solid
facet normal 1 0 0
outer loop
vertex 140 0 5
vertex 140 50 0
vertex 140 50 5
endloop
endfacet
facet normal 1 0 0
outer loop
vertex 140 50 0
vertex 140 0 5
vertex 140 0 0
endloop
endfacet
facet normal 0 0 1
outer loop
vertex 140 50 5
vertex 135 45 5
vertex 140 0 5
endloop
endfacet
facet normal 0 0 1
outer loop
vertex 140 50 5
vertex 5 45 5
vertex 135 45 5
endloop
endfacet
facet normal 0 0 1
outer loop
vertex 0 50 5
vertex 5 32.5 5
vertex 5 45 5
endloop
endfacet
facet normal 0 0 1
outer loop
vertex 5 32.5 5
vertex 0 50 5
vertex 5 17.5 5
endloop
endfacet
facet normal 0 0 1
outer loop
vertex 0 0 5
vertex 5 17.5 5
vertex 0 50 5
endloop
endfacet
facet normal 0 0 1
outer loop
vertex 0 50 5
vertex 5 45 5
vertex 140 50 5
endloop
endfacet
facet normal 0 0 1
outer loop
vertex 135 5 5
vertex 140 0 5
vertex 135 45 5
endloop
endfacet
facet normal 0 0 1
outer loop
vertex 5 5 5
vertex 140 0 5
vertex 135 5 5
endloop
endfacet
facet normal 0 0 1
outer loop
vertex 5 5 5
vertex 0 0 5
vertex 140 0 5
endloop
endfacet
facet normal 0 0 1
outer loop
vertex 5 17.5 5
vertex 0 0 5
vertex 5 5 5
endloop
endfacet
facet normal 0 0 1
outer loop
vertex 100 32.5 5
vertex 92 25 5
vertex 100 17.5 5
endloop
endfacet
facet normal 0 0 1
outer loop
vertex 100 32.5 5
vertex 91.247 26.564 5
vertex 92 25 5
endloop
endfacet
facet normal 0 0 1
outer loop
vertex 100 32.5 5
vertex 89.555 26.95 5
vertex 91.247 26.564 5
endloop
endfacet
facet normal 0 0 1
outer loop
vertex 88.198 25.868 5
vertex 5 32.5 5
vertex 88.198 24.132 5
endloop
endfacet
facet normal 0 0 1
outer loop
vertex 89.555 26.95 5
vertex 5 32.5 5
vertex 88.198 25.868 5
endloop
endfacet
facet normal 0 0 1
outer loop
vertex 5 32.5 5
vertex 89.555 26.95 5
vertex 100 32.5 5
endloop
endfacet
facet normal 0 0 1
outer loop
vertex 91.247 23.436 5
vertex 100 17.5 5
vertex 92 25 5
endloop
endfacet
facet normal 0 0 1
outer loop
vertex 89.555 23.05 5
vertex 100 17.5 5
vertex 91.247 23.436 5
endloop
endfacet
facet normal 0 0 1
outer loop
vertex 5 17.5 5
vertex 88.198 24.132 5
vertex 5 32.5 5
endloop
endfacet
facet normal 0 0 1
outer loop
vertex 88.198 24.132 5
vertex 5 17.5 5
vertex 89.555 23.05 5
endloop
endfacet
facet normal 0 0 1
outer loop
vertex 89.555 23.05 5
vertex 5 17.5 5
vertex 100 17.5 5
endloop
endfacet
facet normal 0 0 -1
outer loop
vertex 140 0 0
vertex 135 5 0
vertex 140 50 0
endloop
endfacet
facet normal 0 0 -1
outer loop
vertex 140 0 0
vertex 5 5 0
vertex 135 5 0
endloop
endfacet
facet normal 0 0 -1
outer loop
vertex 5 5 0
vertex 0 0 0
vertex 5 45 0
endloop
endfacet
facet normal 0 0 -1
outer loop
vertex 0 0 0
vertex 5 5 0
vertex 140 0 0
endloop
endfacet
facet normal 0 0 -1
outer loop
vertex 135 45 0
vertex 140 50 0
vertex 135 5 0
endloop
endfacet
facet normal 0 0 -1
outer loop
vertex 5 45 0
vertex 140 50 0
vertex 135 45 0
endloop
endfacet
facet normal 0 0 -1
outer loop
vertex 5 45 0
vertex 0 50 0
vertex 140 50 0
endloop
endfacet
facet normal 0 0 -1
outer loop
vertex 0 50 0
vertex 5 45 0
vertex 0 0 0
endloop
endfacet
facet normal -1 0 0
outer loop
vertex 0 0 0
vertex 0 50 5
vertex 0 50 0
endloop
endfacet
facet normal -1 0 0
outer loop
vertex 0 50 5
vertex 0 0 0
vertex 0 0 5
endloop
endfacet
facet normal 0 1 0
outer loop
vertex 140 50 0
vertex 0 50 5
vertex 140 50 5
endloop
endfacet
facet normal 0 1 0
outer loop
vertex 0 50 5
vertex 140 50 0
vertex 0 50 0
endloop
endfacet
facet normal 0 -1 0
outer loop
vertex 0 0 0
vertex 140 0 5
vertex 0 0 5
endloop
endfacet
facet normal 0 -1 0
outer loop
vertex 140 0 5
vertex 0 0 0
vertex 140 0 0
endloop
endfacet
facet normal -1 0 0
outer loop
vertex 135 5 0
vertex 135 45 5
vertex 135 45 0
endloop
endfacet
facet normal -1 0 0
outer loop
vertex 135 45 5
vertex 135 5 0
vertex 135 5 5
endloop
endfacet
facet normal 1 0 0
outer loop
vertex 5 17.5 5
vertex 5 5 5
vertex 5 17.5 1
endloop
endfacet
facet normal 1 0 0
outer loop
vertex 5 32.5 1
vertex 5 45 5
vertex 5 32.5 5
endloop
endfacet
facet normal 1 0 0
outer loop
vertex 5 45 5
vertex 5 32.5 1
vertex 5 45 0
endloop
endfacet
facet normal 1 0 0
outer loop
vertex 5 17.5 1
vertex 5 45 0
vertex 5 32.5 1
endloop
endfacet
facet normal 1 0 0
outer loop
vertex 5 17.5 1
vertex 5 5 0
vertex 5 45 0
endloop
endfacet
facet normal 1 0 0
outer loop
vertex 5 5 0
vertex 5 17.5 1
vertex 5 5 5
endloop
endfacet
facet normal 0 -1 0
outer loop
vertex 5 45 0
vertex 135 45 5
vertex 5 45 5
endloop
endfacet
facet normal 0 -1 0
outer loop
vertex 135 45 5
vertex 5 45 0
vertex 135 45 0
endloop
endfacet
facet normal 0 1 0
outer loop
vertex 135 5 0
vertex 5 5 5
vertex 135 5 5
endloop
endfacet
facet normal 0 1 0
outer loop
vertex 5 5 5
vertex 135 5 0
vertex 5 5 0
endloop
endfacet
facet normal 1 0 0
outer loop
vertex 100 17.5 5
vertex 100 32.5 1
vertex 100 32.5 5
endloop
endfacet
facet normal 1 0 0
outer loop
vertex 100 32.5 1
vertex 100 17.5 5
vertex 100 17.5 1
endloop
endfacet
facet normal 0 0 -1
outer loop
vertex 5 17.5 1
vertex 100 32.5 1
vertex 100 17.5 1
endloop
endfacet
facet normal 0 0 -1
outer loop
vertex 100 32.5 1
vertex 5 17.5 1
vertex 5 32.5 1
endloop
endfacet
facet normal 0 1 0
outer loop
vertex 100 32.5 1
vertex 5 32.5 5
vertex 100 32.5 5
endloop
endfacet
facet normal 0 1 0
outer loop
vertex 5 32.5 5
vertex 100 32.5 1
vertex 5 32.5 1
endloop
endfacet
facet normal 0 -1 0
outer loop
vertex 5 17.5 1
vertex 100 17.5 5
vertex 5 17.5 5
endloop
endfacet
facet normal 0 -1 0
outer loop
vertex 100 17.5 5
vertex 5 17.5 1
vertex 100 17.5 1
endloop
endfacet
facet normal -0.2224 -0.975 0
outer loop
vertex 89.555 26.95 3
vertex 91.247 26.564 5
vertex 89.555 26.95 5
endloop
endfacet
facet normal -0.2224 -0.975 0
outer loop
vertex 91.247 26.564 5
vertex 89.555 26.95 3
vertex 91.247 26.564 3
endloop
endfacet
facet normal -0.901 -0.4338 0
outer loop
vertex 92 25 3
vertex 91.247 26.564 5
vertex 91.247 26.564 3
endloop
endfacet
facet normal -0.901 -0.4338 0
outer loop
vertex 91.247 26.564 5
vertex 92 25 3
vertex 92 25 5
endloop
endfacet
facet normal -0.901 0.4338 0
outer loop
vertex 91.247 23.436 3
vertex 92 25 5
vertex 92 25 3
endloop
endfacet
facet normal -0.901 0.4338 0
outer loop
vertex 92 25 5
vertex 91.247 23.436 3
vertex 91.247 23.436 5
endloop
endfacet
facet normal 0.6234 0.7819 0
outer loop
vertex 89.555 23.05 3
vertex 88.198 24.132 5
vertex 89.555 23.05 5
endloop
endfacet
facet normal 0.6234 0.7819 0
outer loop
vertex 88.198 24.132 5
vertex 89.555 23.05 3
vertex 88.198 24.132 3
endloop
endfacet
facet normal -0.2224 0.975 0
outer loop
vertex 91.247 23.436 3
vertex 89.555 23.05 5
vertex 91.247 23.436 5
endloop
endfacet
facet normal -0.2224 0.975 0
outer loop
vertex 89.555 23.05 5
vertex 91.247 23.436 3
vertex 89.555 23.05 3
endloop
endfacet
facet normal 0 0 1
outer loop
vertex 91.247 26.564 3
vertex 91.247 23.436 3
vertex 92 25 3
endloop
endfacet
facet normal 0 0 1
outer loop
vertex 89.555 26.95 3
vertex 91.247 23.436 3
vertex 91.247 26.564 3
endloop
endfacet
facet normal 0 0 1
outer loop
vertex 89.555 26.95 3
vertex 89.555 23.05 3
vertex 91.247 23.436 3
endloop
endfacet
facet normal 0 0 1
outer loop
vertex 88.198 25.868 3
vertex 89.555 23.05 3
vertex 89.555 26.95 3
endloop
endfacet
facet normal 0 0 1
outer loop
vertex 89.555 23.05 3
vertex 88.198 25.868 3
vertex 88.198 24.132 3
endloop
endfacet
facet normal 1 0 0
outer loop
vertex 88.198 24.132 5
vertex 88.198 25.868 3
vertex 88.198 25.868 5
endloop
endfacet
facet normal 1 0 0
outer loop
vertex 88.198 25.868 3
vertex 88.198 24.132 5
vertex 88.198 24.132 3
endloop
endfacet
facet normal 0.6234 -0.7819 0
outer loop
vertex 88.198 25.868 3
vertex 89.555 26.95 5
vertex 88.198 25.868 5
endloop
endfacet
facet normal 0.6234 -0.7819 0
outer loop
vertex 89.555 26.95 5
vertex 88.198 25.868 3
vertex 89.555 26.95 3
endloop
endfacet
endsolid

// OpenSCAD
// Generated by SolidPython 1.1.3 on 2023-10-12 19:07:09


union() {
	difference() {
		cube(size = [140, 50, 5]);
		translate(v = [5, 5, -0.5000000000]) {
			cube(size = [130, 40, 6]);
		}
		translate(v = [10, 25.0000000000, 2.5000000000]) {
			cylinder(h = 6, r = 2.0000000000);
		}
	}
	translate(v = [0, 17.5000000000, 1]) {
		difference() {
			cube(size = [100, 15, 4]);
			translate(v = [90, 7.5000000000, 2.0000000000]) {
				cylinder(h = 6, r = 2.0000000000);
			}
		}
	}
}
